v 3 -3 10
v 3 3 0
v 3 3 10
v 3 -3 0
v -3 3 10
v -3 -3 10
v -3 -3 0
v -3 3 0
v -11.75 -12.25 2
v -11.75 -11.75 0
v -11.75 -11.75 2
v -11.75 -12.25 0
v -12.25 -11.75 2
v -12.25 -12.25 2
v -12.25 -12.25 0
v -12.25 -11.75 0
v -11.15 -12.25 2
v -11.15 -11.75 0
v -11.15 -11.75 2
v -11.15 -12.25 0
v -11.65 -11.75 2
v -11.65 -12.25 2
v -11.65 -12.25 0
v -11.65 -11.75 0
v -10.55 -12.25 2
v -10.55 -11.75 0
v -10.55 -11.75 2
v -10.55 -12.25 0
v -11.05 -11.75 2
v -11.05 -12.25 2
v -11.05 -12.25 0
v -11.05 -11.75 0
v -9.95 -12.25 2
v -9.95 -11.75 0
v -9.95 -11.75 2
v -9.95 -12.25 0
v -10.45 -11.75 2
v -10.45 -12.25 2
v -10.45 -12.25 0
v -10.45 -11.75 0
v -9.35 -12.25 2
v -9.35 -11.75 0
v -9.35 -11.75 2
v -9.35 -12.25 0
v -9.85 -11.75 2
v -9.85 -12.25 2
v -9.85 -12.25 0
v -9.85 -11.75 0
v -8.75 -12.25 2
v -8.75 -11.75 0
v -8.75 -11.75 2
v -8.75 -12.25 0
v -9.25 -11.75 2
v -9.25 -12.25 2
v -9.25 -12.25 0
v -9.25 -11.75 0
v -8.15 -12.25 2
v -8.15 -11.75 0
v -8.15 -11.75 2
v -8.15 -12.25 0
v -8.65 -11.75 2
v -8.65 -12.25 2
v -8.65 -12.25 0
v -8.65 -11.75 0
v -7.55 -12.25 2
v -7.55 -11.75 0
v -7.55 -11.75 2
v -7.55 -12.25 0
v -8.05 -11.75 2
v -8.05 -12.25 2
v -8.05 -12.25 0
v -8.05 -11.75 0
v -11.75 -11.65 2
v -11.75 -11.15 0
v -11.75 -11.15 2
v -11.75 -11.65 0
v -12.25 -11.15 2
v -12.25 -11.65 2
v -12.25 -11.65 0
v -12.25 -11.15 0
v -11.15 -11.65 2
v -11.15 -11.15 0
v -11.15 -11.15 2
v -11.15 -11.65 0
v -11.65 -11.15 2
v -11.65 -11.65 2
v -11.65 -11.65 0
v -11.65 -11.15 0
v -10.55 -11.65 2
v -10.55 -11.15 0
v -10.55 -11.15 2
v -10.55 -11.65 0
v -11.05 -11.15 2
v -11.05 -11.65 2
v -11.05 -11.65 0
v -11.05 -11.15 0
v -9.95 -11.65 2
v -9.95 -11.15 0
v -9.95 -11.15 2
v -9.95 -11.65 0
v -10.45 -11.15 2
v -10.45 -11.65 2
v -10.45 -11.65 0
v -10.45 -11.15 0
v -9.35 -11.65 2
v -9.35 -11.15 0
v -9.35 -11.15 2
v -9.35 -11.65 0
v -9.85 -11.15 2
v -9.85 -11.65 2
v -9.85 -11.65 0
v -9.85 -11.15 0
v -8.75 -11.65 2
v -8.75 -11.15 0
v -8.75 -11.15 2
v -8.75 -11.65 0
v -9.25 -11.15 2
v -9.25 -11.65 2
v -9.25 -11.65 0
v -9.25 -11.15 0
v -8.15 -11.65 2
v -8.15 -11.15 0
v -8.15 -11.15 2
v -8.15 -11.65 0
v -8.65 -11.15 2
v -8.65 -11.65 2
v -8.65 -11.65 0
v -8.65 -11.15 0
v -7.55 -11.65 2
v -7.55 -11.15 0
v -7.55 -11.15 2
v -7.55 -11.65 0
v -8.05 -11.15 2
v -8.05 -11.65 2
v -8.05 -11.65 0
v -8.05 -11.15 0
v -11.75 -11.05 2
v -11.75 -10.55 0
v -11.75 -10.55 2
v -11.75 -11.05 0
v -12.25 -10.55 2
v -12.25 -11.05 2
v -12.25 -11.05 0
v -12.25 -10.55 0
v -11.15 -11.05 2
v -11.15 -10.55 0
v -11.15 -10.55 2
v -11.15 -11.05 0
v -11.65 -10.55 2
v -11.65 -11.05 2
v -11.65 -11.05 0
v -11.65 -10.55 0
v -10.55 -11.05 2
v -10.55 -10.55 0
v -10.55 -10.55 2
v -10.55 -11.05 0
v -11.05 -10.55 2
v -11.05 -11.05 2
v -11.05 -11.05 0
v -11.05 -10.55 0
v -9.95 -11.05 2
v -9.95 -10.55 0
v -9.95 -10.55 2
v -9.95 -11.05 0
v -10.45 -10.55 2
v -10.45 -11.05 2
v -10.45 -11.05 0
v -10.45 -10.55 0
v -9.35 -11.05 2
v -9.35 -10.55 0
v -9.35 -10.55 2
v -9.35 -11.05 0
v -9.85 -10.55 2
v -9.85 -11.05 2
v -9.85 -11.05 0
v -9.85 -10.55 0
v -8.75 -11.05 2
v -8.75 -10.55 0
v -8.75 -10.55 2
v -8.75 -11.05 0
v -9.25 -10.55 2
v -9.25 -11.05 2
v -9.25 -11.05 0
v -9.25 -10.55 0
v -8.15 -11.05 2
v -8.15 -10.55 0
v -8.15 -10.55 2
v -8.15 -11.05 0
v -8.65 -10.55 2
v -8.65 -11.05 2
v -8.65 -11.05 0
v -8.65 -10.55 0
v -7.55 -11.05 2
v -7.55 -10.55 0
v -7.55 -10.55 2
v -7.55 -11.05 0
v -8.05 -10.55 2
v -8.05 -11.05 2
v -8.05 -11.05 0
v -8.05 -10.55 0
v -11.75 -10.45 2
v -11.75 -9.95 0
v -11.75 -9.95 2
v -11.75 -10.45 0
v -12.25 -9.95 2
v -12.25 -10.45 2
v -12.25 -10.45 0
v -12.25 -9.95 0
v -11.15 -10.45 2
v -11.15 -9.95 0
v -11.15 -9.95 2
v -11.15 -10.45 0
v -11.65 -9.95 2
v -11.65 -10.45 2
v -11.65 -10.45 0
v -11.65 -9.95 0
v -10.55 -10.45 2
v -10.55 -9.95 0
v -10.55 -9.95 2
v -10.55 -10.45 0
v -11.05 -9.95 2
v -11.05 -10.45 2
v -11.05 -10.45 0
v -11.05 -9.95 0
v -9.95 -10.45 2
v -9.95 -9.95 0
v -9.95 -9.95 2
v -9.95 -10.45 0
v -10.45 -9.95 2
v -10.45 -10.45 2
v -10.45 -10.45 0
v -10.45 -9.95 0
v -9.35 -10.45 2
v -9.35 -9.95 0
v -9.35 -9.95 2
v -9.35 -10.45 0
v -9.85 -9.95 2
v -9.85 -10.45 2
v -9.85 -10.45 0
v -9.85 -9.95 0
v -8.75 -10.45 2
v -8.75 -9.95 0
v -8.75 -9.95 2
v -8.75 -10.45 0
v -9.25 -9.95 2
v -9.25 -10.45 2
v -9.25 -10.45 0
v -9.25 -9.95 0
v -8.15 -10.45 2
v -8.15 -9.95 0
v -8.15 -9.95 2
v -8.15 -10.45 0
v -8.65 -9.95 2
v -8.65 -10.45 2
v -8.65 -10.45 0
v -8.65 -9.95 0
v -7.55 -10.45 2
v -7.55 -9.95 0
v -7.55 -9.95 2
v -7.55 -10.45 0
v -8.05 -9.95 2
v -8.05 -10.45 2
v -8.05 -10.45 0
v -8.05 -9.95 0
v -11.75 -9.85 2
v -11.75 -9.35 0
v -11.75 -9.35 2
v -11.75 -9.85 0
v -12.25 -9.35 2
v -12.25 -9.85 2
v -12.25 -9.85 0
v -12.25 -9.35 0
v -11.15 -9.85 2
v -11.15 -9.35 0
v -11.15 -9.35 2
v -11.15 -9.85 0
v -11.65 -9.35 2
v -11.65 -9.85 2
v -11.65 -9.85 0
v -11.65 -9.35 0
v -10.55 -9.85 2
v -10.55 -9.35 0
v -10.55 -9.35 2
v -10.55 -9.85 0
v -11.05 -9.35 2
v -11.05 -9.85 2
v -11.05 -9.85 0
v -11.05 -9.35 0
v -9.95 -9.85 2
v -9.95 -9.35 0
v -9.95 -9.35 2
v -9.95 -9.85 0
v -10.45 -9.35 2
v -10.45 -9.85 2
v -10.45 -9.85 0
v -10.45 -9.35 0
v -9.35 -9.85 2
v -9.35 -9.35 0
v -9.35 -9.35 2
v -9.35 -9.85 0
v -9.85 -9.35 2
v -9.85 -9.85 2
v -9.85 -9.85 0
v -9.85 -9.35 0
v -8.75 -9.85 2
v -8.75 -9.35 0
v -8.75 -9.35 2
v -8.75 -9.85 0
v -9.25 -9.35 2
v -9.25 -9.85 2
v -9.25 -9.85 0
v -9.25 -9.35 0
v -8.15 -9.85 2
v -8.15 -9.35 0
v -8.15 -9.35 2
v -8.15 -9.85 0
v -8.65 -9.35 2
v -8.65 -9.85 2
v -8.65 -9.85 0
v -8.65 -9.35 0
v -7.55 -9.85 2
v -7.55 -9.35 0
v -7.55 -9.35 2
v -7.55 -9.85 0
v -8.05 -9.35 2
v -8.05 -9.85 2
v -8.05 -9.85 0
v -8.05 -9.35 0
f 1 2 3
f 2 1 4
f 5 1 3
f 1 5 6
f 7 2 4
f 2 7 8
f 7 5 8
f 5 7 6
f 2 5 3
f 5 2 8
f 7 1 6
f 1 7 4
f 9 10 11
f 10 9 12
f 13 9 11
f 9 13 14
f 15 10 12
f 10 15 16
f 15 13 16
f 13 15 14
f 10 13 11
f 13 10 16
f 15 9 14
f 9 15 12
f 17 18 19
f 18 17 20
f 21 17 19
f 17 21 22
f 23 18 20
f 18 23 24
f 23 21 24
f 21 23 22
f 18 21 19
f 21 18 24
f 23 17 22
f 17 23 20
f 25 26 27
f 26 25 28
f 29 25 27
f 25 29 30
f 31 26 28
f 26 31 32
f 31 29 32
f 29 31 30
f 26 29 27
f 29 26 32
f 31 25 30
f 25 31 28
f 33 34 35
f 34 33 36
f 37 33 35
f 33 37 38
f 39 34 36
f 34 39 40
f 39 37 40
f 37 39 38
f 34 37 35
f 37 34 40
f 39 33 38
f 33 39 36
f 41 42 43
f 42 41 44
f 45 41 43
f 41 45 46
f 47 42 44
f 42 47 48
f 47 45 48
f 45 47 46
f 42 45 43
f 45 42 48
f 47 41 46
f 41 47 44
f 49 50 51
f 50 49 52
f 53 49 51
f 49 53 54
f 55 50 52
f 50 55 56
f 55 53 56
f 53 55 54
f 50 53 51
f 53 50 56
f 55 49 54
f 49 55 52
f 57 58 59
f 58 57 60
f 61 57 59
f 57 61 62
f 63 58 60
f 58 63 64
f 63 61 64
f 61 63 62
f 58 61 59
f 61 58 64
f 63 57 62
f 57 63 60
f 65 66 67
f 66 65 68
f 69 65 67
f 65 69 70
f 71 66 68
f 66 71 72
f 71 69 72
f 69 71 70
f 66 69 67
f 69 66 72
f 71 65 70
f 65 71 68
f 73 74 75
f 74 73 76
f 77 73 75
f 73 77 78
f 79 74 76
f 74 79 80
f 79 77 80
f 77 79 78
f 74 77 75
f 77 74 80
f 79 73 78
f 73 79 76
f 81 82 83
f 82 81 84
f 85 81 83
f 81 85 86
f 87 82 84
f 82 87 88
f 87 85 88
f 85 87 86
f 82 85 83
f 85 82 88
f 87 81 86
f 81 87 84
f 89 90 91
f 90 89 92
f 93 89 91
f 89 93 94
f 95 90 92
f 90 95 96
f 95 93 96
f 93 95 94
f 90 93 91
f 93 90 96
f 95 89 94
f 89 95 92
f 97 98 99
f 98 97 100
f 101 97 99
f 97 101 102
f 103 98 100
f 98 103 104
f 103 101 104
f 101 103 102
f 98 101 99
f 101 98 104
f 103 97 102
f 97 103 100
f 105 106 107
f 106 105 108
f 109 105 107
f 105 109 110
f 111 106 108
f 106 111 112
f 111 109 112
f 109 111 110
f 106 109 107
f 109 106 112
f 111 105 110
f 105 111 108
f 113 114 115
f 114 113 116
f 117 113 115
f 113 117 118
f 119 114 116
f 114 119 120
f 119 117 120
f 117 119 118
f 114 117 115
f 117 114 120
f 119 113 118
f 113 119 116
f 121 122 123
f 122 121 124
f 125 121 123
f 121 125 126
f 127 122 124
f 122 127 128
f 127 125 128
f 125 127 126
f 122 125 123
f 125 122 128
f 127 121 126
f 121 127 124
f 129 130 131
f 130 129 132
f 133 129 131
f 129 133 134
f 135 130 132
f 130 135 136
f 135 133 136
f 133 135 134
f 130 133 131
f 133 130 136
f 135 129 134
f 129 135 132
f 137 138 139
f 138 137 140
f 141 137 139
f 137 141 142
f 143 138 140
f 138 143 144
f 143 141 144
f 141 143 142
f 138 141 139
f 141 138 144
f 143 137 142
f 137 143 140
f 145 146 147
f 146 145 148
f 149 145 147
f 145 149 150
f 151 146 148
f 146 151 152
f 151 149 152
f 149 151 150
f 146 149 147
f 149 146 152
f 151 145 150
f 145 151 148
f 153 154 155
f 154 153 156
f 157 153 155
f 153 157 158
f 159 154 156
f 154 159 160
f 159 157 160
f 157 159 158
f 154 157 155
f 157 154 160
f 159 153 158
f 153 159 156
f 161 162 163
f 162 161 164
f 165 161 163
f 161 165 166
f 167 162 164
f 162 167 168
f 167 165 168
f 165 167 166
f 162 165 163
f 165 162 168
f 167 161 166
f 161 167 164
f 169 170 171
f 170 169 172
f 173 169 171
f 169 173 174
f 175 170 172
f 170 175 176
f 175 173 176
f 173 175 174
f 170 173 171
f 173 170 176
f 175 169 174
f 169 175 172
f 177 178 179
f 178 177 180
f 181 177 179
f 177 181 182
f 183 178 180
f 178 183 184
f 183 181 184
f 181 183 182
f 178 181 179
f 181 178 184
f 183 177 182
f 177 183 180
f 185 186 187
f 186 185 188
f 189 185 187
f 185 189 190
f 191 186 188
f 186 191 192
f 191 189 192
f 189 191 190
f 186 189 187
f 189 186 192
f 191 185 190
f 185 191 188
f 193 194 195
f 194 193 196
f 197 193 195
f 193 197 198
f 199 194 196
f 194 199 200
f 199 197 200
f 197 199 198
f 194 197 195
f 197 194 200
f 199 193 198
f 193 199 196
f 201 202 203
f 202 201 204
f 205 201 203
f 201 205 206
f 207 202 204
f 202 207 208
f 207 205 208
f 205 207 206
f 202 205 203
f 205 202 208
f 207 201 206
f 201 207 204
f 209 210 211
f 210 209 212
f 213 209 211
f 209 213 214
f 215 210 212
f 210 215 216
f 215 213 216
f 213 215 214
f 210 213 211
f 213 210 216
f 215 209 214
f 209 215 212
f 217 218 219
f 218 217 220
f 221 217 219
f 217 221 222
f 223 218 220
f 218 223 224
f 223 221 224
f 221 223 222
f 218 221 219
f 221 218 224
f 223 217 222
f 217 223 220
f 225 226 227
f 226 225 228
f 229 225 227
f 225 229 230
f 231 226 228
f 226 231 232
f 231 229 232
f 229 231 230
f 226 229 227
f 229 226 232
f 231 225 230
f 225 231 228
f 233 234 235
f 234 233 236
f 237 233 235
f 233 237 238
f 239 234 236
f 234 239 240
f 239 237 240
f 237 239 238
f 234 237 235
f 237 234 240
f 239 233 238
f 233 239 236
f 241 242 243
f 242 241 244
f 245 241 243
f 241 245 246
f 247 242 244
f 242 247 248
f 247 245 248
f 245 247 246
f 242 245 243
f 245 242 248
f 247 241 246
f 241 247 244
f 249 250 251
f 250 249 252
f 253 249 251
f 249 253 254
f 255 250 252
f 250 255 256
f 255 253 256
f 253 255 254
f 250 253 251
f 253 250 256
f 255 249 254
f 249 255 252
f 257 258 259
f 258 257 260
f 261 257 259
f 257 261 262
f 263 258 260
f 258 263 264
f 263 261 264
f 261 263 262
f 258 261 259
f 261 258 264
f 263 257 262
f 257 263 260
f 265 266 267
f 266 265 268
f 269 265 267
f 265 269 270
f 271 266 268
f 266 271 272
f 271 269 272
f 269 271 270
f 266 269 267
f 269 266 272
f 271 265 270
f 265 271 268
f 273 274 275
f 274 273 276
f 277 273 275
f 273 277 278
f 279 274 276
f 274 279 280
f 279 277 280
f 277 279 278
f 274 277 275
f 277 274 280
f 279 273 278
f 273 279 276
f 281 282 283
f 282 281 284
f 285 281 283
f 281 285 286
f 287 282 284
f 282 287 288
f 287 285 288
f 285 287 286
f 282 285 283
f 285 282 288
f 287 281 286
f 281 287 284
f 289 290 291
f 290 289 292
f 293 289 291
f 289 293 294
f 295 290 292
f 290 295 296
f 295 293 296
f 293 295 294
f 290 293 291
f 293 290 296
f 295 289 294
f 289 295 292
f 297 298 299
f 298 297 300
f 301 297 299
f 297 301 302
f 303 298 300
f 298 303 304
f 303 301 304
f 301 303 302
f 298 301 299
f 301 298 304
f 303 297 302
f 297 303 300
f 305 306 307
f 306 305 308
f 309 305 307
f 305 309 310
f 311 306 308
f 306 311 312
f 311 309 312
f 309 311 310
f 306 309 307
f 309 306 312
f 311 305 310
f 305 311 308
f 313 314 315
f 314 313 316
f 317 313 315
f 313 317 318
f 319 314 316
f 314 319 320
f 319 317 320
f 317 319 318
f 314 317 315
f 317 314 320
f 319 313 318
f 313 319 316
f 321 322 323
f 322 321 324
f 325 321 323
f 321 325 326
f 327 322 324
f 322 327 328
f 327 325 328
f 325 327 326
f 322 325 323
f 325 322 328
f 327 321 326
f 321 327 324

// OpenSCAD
translate([0, 0, 5]) color([0,1,0,0.9]) cube([6, 6, 10], center=true);
translate([-12.0, -12.0, 1]) color([1,0,0]) cube([0.5, 0.5, 2], center=true);
translate([-11.4, -12.0, 1]) color([1,0,0]) cube([0.5, 0.5, 2], center=true);
translate([-10.8, -12.0, 1]) color([1,0,0]) cube([0.5, 0.5, 2], center=true);
translate([-10.2, -12.0, 1]) color([1,0,0]) cube([0.5, 0.5, 2], center=true);
translate([-9.6, -12.0, 1]) color([1,0,0]) cube([0.5, 0.5, 2], center=true);
translate([-9.0, -12.0, 1]) color([1,0,0]) cube([0.5, 0.5, 2], center=true);
translate([-8.4, -12.0, 1]) color([1,0,0]) cube([0.5, 0.5, 2], center=true);
translate([-7.8, -12.0, 1]) color([1,0,0]) cube([0.5, 0.5, 2], center=true);
translate([-12.0, -11.4, 1]) color([1,0,0]) cube([0.5, 0.5, 2], center=true);
translate([-11.4, -11.4, 1]) color([1,0,0]) cube([0.5, 0.5, 2], center=true);
translate([-10.8, -11.4, 1]) color([1,0,0]) cube([0.5, 0.5, 2], center=true);
translate([-10.2, -11.4, 1]) color([1,0,0]) cube([0.5, 0.5, 2], center=true);
translate([-9.6, -11.4, 1]) color([1,0,0]) cube([0.5, 0.5, 2], center=true);
translate([-9.0, -11.4, 1]) color([1,0,0]) cube([0.5, 0.5, 2], center=true);
translate([-8.4, -11.4, 1]) color([1,0,0]) cube([0.5, 0.5, 2], center=true);
translate([-7.8, -11.4, 1]) color([1,0,0]) cube([0.5, 0.5, 2], center=true);
translate([-12.0, -10.8, 1]) color([1,0,0]) cube([0.5, 0.5, 2], center=true);
translate([-11.4, -10.8, 1]) color([1,0,0]) cube([0.5, 0.5, 2], center=true);
translate([-10.8, -10.8, 1]) color([1,0,0]) cube([0.5, 0.5, 2], center=true);
translate([-10.2, -10.8, 1]) color([1,0,0]) cube([0.5, 0.5, 2], center=true);
translate([-9.6, -10.8, 1]) color([1,0,0]) cube([0.5, 0.5, 2], center=true);
translate([-9.0, -10.8, 1]) color([1,0,0]) cube([0.5, 0.5, 2], center=true);
translate([-8.4, -10.8, 1]) color([1,0,0]) cube([0.5, 0.5, 2], center=true);
translate([-7.8, -10.8, 1]) color([1,0,0]) cube([0.5, 0.5, 2], center=true);
translate([-12.0, -10.2, 1]) color([1,0,0]) cube([0.5, 0.5, 2], center=true);
translate([-11.4, -10.2, 1]) color([1,0,0]) cube([0.5, 0.5, 2], center=true);
translate([-10.8, -10.2, 1]) color([1,0,0]) cube([0.5, 0.5, 2], center=true);
translate([-10.2, -10.2, 1]) color([1,0,0]) cube([0.5, 0.5, 2], center=true);
translate([-9.6, -10.2, 1]) color([1,0,0]) cube([0.5, 0.5, 2], center=true);
translate([-9.0, -10.2, 1]) color([1,0,0]) cube([0.5, 0.5, 2], center=true);
translate([-8.4, -10.2, 1]) color([1,0,0]) cube([0.5, 0.5, 2], center=true);
translate([-7.8, -10.2, 1]) color([1,0,0]) cube([0.5, 0.5, 2], center=true);
translate([-12.0, -9.6, 1]) color([1,0,0]) cube([0.5, 0.5, 2], center=true);
translate([-11.4, -9.6, 1]) color([1,0,0]) cube([0.5, 0.5, 2], center=true);
translate([-10.8, -9.6, 1]) color([1,0,0]) cube([0.5, 0.5, 2], center=true);
translate([-10.2, -9.6, 1]) color([1,0,0]) cube([0.5, 0.5, 2], center=true);
translate([-9.6, -9.6, 1]) color([1,0,0]) cube([0.5, 0.5, 2], center=true);
translate([-9.0, -9.6, 1]) color([1,0,0]) cube([0.5, 0.5, 2], center=true);
translate([-8.4, -9.6, 1]) color([1,0,0]) cube([0.5, 0.5, 2], center=true);
translate([-7.8, -9.6, 1]) color([1,0,0]) cube([0.5, 0.5, 2], center=true);
